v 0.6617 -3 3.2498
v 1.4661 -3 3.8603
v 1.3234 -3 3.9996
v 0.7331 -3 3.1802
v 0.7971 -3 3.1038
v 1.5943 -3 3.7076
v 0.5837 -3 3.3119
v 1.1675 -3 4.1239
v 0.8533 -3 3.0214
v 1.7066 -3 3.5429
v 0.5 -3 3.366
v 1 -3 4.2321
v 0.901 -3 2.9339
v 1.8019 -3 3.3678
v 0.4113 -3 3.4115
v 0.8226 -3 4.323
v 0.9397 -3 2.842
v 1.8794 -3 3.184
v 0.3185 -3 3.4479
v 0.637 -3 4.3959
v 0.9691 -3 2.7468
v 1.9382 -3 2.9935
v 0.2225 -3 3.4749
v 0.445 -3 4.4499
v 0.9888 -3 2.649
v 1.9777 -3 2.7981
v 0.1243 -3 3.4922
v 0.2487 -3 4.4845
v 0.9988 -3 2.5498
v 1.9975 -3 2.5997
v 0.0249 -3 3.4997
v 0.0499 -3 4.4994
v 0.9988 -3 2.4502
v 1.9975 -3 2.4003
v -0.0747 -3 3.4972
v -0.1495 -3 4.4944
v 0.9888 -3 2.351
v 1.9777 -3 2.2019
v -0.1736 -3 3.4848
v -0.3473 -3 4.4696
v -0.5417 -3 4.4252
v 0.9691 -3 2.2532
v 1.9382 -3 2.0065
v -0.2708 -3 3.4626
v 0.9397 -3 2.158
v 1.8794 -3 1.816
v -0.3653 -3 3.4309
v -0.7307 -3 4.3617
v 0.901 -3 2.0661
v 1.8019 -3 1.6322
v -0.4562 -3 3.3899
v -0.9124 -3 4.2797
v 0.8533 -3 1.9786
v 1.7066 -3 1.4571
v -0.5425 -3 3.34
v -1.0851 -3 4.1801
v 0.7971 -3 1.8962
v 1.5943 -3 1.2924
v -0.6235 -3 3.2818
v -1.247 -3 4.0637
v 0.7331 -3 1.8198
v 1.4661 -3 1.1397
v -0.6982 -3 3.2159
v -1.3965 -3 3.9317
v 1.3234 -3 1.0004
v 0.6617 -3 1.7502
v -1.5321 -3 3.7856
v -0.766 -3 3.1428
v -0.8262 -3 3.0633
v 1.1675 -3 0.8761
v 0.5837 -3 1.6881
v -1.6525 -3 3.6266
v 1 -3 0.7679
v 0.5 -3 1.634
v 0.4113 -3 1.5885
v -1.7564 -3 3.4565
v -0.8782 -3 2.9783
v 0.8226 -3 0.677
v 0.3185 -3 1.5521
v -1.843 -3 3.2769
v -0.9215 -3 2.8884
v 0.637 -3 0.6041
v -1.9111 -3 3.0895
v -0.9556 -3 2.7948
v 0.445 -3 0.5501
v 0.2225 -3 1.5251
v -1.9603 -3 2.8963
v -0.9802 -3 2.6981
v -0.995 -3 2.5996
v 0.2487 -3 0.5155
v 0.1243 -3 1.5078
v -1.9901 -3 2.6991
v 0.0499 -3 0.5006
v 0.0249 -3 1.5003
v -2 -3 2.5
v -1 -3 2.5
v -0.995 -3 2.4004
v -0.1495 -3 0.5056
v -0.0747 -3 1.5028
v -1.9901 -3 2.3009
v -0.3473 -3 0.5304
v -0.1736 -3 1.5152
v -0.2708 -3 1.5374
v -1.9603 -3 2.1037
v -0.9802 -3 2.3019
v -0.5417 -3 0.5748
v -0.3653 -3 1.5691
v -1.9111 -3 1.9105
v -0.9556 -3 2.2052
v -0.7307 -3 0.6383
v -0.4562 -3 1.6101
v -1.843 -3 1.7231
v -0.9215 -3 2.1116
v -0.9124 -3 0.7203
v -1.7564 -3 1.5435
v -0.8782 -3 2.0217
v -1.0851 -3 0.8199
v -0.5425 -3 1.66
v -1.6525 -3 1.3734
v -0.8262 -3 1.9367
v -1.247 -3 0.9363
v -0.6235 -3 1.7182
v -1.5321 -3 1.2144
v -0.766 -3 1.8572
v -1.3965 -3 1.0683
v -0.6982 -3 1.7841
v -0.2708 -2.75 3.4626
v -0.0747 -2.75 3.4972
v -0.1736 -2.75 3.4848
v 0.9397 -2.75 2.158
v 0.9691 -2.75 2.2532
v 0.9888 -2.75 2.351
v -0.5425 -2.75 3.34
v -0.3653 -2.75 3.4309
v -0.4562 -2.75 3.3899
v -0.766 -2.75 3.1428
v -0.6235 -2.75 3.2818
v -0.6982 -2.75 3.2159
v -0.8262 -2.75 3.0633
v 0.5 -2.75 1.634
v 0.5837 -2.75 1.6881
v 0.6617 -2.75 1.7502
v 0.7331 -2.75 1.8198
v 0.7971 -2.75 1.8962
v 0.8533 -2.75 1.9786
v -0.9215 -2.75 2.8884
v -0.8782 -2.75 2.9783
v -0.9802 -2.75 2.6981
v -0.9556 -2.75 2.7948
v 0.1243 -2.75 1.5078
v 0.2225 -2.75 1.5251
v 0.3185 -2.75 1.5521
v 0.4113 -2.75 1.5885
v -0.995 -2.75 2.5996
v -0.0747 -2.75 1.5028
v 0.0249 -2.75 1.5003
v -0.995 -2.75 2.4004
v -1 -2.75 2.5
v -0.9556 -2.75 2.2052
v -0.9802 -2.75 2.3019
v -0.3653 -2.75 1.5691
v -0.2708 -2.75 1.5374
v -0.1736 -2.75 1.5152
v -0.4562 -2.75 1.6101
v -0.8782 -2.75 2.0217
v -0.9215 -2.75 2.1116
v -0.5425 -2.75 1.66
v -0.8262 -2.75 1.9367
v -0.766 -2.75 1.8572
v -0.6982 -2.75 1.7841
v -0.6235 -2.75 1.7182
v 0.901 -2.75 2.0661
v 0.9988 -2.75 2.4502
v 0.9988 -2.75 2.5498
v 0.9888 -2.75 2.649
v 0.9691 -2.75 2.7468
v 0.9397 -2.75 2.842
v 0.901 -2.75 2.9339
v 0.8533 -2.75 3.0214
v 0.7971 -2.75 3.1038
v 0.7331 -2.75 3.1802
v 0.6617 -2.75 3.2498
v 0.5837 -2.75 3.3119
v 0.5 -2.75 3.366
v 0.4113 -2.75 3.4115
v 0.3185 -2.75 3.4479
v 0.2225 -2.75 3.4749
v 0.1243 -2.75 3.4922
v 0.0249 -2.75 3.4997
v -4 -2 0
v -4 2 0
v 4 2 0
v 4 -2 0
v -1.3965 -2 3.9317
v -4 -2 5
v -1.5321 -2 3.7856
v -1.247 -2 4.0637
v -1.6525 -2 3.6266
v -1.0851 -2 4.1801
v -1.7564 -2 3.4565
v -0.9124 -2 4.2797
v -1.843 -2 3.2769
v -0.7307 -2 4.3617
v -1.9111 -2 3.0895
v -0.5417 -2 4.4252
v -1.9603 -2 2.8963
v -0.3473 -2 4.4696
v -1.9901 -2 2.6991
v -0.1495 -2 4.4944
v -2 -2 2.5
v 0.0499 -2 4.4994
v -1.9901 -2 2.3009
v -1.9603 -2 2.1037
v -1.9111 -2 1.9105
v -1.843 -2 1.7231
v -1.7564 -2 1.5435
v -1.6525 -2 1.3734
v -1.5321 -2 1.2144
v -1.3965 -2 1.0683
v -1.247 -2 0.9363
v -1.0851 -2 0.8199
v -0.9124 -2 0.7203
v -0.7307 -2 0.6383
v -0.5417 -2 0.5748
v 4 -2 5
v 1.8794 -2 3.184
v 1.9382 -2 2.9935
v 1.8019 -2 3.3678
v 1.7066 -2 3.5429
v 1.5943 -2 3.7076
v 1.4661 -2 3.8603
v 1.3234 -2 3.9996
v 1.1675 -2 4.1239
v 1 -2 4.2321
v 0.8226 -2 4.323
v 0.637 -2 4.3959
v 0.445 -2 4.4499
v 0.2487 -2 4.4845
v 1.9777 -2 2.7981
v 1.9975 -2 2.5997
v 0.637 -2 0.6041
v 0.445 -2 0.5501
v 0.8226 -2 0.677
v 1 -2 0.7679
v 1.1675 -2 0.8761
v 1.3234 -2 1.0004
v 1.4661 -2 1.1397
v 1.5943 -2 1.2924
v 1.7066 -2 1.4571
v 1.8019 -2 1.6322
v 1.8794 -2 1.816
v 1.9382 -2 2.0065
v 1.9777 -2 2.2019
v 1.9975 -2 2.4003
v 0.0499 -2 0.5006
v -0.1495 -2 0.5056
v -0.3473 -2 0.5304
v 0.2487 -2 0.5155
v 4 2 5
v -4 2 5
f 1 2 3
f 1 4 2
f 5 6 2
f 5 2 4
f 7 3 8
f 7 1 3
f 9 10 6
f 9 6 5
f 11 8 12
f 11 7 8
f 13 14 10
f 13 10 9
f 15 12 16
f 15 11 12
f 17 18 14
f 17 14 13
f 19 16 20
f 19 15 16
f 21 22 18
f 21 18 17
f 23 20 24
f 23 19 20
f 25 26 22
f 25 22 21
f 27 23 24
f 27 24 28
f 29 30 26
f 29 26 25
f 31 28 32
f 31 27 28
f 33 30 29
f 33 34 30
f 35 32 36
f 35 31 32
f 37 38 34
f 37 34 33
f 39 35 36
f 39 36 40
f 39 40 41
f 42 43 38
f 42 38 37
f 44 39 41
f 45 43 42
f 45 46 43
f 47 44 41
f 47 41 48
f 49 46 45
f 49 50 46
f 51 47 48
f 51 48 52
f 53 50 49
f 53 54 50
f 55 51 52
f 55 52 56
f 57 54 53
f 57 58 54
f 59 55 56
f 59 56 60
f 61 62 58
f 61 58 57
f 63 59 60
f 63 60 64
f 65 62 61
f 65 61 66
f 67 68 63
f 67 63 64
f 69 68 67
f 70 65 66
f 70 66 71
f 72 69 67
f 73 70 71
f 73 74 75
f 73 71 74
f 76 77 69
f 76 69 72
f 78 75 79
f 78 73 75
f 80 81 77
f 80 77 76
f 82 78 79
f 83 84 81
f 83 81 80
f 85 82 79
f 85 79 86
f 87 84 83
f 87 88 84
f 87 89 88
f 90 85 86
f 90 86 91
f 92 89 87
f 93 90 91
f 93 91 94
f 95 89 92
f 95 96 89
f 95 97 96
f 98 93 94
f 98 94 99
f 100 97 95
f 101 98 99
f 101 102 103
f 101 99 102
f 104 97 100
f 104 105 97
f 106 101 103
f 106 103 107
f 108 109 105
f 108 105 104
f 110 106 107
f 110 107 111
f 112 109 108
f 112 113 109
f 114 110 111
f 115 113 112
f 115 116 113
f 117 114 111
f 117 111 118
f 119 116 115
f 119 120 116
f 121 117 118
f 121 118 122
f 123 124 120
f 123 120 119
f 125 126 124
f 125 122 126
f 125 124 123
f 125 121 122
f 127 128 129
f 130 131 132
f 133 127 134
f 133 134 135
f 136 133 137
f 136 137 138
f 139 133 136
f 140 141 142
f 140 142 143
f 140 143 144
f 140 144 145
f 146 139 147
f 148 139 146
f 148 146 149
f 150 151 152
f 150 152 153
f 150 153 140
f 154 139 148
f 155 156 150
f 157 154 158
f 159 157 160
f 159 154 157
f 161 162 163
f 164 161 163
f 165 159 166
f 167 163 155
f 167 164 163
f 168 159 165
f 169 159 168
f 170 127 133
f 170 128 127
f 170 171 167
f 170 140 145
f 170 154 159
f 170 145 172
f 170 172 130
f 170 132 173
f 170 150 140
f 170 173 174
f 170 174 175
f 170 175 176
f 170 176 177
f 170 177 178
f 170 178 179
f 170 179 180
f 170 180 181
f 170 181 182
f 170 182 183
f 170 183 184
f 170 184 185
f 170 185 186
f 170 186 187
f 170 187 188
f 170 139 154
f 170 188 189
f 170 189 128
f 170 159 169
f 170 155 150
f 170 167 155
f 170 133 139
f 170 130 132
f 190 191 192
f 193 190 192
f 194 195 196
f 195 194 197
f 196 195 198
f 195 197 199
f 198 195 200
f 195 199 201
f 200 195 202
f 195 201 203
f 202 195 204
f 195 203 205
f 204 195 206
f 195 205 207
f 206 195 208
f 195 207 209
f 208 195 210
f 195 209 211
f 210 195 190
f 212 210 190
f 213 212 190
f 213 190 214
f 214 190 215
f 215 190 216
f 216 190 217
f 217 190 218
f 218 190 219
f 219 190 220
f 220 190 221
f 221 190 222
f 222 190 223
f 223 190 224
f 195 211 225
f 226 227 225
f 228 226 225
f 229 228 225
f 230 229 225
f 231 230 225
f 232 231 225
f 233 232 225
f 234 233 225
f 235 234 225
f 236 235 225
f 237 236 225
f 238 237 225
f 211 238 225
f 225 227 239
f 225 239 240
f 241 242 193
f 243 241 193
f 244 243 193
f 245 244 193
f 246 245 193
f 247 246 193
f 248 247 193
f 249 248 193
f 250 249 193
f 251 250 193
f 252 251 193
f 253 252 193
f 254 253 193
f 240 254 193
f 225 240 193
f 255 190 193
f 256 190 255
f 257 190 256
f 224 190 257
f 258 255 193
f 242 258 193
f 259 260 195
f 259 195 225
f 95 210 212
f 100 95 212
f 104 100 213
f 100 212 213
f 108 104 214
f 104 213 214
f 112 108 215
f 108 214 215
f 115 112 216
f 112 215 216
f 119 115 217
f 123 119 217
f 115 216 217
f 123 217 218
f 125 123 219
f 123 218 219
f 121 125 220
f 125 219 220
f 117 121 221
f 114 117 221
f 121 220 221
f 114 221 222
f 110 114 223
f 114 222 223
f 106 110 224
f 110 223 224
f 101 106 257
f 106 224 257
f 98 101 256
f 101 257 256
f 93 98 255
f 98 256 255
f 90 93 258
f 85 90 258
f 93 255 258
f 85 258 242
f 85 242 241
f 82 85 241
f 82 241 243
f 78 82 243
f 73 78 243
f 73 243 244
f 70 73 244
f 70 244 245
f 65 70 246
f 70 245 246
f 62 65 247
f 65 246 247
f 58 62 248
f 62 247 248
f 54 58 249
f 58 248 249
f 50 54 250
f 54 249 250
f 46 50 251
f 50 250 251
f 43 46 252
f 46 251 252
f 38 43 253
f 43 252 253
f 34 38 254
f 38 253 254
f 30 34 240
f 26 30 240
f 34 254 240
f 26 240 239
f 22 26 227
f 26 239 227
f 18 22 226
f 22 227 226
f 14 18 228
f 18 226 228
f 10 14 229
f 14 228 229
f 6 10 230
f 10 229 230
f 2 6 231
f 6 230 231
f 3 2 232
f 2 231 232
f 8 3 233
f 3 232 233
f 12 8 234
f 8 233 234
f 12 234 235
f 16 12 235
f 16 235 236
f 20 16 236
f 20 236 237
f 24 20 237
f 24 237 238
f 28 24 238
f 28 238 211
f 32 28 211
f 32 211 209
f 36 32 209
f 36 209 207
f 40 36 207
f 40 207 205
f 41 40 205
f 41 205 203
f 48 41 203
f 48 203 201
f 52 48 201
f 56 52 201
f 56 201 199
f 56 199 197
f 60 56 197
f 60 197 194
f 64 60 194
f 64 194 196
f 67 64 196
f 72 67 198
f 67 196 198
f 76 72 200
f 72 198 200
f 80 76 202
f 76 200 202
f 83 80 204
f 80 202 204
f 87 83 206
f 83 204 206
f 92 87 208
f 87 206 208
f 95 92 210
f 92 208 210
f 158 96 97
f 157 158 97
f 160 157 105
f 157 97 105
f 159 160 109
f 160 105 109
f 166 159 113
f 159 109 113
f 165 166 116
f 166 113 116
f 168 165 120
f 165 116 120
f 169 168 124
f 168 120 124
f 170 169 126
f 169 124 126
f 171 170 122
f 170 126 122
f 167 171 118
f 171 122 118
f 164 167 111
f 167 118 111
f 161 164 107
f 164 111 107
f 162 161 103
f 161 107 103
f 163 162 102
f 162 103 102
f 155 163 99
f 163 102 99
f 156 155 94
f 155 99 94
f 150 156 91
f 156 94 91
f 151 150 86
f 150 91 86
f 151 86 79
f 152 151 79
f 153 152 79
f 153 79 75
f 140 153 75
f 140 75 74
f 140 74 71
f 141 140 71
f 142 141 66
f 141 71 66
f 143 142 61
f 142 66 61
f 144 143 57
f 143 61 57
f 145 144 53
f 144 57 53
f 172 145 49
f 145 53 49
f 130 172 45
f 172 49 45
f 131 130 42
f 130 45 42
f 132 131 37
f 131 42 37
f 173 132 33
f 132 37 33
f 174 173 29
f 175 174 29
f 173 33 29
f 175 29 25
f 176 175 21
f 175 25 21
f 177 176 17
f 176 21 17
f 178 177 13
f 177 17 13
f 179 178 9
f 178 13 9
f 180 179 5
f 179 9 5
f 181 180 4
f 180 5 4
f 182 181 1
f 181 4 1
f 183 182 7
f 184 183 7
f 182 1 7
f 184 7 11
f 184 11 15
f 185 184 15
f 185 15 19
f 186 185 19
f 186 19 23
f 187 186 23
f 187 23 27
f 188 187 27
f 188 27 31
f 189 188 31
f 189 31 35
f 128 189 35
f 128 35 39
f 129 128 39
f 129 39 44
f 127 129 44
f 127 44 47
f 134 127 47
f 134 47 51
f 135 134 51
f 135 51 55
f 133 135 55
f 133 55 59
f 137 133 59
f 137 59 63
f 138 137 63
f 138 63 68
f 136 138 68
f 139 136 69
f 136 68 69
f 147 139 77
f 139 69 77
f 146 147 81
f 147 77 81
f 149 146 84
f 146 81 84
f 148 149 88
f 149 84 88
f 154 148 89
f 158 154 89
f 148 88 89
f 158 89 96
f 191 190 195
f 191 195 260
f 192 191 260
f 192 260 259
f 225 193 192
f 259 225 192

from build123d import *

# Parameters (mm, degrees)
SKETCH1_W           = 8
SKETCH1_H           = 4
BOSS_EXTRUDE1_DEPTH = 5
SKETCH2_R           = 2
BOSS_EXTRUDE2_DEPTH = 1
SKETCH5_R           = 1
CUT_EXTRUDE1_DEPTH  = 0.25


with BuildPart() as part:
    # Sketch1 → Boss-Extrude1 (new body)
    with BuildSketch(Plane.XY):
        Rectangle(SKETCH1_W, SKETCH1_H)
    extrude(amount=BOSS_EXTRUDE1_DEPTH)

    # Sketch2 → Boss-Extrude2 (add)
    with BuildSketch(Plane(origin=(0, -2, 0), x_dir=(-1, 0, 0), z_dir=(0, -1, 0))):
        with Locations((0, -2.5)):
            Circle(SKETCH2_R)
    extrude(amount=BOSS_EXTRUDE2_DEPTH)

    # Sketch5 → Cut-Extrude1 (cut)
    with BuildSketch(Plane(origin=(0, -3, 0), x_dir=(-1, 0, 0), z_dir=(0, -1, 0))):
        with Locations((0, -2.5)):
            Circle(SKETCH5_R)
    extrude(amount=-CUT_EXTRUDE1_DEPTH, mode=Mode.SUBTRACT)


solid = part.part
